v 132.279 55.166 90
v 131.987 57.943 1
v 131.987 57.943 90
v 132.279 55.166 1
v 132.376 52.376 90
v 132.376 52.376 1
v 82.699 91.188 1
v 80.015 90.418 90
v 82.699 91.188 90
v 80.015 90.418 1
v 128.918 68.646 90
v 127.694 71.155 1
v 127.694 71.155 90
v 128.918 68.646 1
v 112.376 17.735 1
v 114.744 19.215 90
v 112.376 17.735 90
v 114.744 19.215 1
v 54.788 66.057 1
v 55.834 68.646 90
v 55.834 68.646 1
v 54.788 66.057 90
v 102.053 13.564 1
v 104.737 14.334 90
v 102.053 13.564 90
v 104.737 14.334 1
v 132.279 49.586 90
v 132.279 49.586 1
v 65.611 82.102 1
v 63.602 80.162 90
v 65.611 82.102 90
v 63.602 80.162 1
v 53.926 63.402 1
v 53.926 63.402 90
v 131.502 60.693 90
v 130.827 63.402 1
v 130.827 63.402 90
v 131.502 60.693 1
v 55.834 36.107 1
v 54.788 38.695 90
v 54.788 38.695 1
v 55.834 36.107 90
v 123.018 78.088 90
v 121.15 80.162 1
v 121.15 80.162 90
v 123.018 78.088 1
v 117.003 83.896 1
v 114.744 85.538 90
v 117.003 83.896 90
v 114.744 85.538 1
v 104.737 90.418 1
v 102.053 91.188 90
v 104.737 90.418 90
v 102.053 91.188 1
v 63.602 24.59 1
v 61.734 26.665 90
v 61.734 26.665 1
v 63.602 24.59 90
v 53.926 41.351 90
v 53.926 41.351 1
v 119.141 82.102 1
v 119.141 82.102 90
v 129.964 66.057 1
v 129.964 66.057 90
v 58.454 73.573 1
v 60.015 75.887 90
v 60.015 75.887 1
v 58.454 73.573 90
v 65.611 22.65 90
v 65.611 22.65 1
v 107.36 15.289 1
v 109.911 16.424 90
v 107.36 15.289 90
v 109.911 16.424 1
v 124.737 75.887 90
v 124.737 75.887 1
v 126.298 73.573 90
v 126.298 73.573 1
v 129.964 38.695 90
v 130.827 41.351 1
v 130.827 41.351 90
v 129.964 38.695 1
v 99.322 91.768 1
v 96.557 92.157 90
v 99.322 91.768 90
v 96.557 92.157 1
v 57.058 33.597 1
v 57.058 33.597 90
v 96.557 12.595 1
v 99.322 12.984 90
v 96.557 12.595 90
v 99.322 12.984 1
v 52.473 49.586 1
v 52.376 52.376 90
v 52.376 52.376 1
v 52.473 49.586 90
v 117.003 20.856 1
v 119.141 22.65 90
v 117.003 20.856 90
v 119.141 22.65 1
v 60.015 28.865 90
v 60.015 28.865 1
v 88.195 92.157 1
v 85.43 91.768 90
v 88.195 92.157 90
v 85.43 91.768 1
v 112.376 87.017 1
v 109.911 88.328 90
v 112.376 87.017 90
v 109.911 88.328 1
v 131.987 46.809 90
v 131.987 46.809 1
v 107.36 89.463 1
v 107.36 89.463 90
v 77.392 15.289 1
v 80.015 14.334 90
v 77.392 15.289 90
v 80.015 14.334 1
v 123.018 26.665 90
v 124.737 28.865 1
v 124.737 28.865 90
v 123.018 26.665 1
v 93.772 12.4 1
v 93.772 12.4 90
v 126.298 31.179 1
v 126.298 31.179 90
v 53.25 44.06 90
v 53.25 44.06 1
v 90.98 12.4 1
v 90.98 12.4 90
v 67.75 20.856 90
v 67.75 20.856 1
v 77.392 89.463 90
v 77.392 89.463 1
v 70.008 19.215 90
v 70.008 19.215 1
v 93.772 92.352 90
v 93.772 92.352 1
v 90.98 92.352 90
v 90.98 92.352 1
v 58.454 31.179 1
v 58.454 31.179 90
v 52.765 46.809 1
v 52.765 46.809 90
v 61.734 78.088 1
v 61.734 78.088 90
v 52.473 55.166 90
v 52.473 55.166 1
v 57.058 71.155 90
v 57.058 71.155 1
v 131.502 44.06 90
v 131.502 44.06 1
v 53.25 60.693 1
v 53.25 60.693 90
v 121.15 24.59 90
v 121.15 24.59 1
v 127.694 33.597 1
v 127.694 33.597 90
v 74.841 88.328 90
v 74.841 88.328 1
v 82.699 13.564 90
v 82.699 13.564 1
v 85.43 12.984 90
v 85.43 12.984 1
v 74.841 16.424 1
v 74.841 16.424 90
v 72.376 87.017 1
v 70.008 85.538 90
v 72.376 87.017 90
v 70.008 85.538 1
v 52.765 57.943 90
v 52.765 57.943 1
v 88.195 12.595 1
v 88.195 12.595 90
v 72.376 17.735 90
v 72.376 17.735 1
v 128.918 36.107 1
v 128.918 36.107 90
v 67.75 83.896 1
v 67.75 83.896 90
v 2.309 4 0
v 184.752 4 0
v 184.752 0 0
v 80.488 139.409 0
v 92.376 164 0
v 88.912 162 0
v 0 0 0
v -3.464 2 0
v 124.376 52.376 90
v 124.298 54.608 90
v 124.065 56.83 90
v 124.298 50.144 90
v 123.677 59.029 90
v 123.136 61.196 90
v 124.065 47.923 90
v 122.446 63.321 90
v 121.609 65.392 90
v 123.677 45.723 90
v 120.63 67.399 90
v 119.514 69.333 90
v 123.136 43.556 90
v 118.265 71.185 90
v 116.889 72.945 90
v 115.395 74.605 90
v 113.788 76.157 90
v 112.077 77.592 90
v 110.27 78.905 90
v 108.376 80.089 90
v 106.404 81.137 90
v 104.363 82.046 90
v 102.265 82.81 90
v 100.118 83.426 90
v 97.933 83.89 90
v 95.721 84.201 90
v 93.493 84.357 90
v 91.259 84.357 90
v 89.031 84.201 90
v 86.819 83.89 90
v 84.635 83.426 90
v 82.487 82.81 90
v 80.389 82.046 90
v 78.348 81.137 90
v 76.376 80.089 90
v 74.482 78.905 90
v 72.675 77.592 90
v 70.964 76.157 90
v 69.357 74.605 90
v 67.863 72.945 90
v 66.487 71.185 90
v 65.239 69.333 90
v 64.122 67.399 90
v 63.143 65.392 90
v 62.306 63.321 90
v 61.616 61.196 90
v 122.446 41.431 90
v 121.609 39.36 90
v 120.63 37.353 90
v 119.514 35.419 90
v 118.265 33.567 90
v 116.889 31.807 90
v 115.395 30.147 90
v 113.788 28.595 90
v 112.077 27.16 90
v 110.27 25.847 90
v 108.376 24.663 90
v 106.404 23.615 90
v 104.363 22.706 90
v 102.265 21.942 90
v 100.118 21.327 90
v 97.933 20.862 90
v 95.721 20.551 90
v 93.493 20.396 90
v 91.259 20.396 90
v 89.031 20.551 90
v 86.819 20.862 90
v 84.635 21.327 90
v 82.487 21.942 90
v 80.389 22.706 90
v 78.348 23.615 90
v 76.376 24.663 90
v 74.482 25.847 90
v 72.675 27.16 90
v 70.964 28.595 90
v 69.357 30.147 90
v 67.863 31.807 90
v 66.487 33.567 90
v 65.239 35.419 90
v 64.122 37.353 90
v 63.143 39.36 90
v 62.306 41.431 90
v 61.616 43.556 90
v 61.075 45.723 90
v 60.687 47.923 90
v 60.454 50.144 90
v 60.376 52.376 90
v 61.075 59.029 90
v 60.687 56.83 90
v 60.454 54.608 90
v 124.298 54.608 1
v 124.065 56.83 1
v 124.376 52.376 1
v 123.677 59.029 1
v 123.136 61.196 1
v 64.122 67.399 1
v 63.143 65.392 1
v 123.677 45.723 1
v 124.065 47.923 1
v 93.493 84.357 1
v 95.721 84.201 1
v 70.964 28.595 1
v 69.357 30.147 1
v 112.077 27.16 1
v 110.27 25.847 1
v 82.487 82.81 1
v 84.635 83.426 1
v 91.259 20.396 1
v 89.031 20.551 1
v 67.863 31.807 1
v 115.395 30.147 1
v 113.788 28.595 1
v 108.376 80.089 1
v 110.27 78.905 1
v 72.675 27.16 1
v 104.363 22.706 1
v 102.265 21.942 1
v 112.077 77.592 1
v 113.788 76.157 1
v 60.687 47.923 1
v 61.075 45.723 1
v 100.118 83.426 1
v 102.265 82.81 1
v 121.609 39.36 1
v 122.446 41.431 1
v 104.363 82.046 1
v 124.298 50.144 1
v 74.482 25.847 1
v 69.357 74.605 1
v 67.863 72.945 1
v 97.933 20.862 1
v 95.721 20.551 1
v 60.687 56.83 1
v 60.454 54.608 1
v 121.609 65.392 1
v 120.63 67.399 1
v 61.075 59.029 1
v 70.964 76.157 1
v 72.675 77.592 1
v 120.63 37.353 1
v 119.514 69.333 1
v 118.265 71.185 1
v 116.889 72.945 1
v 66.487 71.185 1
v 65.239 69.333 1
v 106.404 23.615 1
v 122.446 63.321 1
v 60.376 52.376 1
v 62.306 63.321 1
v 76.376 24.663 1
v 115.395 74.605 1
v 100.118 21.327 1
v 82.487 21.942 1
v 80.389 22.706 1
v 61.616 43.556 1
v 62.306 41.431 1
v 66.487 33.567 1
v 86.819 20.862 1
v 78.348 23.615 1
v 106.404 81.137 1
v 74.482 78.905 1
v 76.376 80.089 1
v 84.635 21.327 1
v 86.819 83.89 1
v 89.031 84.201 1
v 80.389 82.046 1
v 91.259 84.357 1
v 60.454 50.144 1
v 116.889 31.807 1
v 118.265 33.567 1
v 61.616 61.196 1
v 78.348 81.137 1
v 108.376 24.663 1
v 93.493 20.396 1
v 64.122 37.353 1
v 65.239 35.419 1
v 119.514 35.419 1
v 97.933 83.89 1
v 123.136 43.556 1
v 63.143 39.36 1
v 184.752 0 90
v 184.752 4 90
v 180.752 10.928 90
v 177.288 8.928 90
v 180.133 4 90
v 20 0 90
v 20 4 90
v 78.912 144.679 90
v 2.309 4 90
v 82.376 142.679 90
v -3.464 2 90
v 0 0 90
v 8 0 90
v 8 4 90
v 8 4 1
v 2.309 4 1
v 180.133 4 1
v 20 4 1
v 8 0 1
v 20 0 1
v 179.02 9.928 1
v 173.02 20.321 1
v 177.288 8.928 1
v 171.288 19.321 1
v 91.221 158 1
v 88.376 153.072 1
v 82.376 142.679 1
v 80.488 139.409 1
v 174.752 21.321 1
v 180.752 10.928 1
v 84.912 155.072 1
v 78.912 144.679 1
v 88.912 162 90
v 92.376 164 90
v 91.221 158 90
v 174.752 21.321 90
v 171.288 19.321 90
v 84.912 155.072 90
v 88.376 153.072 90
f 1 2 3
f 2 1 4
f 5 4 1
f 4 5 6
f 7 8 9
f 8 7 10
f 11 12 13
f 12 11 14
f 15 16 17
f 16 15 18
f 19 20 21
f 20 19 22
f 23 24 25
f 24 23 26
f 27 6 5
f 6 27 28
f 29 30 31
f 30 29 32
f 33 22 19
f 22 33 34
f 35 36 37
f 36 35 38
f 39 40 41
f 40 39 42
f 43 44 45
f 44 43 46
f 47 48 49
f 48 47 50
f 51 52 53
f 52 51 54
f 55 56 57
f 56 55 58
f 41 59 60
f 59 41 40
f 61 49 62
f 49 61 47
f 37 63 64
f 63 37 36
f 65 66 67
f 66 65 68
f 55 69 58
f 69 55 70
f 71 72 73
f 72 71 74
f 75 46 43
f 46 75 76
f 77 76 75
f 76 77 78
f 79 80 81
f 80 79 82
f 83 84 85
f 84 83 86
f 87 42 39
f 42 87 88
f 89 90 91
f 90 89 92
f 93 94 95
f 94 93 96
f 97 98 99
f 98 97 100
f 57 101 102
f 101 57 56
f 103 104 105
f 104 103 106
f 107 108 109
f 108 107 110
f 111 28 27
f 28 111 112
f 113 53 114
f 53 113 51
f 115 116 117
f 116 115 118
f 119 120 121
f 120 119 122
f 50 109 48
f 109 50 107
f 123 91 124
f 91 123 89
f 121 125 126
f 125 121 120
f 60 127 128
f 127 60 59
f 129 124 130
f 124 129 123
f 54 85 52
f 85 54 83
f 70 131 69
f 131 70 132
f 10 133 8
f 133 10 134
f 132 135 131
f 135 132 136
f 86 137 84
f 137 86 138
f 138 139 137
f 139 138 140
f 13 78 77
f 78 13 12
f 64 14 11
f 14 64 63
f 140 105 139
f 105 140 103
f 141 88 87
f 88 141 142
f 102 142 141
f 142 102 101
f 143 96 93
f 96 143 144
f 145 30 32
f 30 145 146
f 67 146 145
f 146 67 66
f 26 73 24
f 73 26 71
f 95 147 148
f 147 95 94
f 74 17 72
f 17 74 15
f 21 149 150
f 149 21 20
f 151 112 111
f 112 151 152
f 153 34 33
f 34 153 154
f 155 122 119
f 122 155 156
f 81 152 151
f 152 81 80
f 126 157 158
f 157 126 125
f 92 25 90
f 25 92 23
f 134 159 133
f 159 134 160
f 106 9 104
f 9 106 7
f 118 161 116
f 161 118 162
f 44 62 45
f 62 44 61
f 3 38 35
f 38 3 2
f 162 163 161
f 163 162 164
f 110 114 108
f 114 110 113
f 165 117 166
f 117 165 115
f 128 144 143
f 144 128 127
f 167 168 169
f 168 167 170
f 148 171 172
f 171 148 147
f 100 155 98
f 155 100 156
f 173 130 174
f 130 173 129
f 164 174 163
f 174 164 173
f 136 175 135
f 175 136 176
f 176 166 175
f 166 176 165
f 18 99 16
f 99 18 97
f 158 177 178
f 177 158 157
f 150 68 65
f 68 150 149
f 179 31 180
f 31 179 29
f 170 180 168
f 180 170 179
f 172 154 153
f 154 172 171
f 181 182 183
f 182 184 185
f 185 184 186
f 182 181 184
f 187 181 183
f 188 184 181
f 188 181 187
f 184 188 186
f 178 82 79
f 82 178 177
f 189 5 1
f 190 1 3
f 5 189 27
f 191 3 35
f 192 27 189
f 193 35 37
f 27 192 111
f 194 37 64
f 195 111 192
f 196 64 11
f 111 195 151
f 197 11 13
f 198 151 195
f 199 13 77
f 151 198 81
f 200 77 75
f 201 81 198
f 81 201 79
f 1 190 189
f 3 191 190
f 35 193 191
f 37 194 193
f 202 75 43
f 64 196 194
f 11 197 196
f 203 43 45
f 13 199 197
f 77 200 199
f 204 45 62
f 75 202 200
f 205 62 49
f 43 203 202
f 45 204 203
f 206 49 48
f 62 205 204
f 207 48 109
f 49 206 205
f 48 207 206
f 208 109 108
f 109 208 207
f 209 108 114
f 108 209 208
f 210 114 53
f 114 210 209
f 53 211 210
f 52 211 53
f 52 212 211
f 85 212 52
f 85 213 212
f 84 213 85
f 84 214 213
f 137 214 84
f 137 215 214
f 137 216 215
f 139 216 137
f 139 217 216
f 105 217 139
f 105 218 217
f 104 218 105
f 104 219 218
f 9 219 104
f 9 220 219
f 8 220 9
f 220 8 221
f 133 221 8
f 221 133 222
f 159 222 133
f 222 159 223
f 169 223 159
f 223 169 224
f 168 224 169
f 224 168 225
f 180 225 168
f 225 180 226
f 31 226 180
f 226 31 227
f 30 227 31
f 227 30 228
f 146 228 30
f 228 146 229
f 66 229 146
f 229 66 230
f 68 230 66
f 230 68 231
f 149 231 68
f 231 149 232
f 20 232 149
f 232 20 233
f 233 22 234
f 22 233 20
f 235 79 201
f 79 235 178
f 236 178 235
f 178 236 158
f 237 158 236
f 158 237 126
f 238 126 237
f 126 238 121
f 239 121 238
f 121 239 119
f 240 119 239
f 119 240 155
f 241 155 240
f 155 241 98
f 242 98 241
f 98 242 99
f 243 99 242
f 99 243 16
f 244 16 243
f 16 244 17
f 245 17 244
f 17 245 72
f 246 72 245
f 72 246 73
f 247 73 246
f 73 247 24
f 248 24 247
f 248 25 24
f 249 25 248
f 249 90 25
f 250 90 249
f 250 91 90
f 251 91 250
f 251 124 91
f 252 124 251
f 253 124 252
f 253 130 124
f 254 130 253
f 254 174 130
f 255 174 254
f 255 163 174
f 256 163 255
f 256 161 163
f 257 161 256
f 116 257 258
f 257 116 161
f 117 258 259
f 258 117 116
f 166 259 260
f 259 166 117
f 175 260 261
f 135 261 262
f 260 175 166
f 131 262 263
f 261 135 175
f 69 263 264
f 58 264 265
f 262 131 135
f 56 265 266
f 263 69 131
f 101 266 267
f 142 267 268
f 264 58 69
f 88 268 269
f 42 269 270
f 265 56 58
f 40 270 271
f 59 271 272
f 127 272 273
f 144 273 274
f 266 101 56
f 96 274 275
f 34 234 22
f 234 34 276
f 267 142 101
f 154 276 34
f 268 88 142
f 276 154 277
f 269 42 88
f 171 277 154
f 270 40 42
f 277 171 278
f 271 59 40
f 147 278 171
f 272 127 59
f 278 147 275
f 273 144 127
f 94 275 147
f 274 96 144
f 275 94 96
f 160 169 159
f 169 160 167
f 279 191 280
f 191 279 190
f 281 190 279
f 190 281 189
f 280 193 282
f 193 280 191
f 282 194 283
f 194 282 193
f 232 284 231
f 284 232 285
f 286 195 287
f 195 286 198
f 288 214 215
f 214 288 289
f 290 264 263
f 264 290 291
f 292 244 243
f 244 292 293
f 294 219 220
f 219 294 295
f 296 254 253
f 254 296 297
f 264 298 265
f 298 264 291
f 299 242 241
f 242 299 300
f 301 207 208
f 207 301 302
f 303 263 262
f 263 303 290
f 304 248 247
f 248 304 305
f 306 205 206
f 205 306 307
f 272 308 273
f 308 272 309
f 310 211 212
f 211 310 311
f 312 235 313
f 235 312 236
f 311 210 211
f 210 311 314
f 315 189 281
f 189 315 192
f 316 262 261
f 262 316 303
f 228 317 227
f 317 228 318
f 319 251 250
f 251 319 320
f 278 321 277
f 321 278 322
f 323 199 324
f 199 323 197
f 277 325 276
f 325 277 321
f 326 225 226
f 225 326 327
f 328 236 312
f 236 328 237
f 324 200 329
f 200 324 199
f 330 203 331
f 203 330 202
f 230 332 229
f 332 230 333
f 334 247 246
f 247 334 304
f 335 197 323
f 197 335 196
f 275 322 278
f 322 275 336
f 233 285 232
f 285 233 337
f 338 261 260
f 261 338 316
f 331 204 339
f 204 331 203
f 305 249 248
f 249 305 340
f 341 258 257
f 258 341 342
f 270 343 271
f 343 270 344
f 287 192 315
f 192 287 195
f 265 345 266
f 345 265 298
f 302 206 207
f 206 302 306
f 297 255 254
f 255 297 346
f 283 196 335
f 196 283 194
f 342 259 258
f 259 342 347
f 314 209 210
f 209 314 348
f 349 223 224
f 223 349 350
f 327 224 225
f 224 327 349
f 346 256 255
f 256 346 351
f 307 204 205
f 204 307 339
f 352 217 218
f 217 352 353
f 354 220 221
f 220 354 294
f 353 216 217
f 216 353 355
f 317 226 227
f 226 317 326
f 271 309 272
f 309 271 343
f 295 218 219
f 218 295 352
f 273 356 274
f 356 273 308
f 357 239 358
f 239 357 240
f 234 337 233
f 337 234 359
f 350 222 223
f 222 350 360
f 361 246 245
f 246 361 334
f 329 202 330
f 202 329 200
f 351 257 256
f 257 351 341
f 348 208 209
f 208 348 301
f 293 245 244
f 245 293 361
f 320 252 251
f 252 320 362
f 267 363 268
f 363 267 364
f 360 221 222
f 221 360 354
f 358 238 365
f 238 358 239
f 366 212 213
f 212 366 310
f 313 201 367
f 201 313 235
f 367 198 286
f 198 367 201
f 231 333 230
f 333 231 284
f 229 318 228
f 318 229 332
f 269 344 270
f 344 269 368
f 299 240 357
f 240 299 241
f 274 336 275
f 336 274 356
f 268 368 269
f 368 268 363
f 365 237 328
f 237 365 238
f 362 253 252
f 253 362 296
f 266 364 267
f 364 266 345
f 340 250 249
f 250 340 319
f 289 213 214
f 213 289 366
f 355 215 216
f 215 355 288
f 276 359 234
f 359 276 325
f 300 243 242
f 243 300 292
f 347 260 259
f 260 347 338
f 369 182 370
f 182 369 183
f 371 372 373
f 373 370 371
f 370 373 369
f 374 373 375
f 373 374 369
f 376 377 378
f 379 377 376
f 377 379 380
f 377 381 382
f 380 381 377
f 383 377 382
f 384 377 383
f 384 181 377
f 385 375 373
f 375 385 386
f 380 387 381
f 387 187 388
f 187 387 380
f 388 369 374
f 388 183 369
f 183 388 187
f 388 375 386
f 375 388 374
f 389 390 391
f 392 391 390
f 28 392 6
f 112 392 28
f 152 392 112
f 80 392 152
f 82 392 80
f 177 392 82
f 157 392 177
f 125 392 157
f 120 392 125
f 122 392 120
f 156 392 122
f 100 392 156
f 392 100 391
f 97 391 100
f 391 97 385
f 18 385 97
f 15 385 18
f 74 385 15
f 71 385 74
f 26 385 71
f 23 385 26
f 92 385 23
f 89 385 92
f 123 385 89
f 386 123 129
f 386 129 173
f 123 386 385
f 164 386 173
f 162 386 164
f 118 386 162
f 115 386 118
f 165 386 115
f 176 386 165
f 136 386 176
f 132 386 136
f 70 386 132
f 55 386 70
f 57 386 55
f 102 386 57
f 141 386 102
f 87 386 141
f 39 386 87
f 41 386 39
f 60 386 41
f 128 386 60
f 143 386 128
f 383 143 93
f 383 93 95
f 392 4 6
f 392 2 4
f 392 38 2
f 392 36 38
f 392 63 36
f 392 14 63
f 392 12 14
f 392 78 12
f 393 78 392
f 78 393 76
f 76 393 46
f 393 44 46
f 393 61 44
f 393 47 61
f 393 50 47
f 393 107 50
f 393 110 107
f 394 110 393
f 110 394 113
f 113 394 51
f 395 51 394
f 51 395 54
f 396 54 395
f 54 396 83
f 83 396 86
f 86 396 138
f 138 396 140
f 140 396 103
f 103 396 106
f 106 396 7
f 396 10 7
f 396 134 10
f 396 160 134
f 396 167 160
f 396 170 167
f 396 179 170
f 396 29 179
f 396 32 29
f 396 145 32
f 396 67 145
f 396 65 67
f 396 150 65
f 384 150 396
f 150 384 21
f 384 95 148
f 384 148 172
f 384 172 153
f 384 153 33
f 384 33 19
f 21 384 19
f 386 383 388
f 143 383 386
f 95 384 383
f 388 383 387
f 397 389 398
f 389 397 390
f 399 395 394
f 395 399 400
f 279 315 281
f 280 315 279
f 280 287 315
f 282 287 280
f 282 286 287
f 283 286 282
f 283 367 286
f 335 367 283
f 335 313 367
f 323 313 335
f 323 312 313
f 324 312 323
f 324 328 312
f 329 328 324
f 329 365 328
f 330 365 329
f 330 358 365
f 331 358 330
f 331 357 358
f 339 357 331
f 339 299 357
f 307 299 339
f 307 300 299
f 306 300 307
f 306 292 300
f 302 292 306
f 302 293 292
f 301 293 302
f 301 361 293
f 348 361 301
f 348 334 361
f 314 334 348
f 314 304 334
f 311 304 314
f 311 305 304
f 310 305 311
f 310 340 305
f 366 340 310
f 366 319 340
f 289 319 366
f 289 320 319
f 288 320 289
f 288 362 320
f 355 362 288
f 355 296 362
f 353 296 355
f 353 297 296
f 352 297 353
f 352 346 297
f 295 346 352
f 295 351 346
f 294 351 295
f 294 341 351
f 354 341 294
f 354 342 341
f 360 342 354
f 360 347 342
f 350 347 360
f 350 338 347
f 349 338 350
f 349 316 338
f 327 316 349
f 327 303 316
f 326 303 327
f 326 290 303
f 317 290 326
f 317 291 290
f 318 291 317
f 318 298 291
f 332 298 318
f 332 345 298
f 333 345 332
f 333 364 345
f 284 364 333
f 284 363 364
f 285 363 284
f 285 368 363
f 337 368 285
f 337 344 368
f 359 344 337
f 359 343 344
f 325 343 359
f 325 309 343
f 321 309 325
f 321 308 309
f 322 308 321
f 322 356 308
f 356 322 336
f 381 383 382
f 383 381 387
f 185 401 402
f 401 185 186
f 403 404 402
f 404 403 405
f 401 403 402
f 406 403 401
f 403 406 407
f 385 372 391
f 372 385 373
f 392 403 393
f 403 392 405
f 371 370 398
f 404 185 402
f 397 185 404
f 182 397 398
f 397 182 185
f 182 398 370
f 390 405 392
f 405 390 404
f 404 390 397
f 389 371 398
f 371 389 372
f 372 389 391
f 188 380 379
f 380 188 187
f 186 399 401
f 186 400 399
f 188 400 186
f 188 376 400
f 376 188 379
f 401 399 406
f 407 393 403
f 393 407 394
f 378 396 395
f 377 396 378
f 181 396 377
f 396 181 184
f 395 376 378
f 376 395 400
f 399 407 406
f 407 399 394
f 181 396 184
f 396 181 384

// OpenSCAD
// file: modules/triangle.scad
module triangle(width, height){
	side = (width/sin(60))*sin(90);
	linear_extrude(height=height){
		polygon(
			points= [
				[0,0],
				[side,0],
				[side/2,width]
			]
		);
	}
}

module triangle_center(width, height){
	side = (width/sin(60))*sin(90);
	linear_extrude(height=height){
		polygon(
			points=[
				[-side/2,0],
				[side/2,0],
				[0,width]
			]
		);
	}
}
// file: modules/inner_cylinder.scad
module inner_cylinder() {
	difference(){
		translate([CylinderDiameter/2,CylinderDiameter/2,0])
			cylinder(h=CylinderHeight,r1=CylinderDiameter/2,r2=CylinderDiameter/2);
		translate([(CylinderDiameter/2),(CylinderDiameter/2),-1])
			cylinder(h=CylinderHeight+CylinderThickness,r1=(CylinderDiameter/2)-(CylinderThickness*2),r2=(CylinderDiameter/2)-(CylinderThickness*2));
	}
}
// main file
include <modules/inner_cylinder.scad>
include <modules/triangle.scad>

// Cable storage

$fn = 90;

CylinderHeight      = 90;
CylinderDiameter    = 80;
CylinderThickness   = 4;

TriangleHeight      = 90;
TriangleWidth       = 160;
TriangleSide        = (TriangleWidth/sin(60))*sin(90);
TriangleThickness   = 4;

NotchWidth          = 12;

BaseThickness       = 1;


// Inner cylinder
translate([TriangleSide/2-CylinderDiameter/2,(TriangleSide/2)-(CylinderDiameter),0]){
    inner_cylinder();
}

// Sides
wall_with_notch();

translate([TriangleSide,TriangleThickness,0]){
    rotate([0,0,120])
        wall_with_notch();
}

translate([TriangleSide/2,TriangleWidth,0]){
    rotate([0,0,60]){
        mirror([1,0,0])
            wall_with_notch();
    }
}



// Base
translate([TriangleSide/2,0,0]){
    triangle_center(TriangleWidth, BaseThickness);
}


module wall_with_notch(){
    difference(){
        cube([TriangleSide,TriangleThickness,TriangleHeight]);
        // Notches
        translate([8,-1,BaseThickness])
            cube([12,TriangleThickness+2,TriangleHeight]);
    }
}
